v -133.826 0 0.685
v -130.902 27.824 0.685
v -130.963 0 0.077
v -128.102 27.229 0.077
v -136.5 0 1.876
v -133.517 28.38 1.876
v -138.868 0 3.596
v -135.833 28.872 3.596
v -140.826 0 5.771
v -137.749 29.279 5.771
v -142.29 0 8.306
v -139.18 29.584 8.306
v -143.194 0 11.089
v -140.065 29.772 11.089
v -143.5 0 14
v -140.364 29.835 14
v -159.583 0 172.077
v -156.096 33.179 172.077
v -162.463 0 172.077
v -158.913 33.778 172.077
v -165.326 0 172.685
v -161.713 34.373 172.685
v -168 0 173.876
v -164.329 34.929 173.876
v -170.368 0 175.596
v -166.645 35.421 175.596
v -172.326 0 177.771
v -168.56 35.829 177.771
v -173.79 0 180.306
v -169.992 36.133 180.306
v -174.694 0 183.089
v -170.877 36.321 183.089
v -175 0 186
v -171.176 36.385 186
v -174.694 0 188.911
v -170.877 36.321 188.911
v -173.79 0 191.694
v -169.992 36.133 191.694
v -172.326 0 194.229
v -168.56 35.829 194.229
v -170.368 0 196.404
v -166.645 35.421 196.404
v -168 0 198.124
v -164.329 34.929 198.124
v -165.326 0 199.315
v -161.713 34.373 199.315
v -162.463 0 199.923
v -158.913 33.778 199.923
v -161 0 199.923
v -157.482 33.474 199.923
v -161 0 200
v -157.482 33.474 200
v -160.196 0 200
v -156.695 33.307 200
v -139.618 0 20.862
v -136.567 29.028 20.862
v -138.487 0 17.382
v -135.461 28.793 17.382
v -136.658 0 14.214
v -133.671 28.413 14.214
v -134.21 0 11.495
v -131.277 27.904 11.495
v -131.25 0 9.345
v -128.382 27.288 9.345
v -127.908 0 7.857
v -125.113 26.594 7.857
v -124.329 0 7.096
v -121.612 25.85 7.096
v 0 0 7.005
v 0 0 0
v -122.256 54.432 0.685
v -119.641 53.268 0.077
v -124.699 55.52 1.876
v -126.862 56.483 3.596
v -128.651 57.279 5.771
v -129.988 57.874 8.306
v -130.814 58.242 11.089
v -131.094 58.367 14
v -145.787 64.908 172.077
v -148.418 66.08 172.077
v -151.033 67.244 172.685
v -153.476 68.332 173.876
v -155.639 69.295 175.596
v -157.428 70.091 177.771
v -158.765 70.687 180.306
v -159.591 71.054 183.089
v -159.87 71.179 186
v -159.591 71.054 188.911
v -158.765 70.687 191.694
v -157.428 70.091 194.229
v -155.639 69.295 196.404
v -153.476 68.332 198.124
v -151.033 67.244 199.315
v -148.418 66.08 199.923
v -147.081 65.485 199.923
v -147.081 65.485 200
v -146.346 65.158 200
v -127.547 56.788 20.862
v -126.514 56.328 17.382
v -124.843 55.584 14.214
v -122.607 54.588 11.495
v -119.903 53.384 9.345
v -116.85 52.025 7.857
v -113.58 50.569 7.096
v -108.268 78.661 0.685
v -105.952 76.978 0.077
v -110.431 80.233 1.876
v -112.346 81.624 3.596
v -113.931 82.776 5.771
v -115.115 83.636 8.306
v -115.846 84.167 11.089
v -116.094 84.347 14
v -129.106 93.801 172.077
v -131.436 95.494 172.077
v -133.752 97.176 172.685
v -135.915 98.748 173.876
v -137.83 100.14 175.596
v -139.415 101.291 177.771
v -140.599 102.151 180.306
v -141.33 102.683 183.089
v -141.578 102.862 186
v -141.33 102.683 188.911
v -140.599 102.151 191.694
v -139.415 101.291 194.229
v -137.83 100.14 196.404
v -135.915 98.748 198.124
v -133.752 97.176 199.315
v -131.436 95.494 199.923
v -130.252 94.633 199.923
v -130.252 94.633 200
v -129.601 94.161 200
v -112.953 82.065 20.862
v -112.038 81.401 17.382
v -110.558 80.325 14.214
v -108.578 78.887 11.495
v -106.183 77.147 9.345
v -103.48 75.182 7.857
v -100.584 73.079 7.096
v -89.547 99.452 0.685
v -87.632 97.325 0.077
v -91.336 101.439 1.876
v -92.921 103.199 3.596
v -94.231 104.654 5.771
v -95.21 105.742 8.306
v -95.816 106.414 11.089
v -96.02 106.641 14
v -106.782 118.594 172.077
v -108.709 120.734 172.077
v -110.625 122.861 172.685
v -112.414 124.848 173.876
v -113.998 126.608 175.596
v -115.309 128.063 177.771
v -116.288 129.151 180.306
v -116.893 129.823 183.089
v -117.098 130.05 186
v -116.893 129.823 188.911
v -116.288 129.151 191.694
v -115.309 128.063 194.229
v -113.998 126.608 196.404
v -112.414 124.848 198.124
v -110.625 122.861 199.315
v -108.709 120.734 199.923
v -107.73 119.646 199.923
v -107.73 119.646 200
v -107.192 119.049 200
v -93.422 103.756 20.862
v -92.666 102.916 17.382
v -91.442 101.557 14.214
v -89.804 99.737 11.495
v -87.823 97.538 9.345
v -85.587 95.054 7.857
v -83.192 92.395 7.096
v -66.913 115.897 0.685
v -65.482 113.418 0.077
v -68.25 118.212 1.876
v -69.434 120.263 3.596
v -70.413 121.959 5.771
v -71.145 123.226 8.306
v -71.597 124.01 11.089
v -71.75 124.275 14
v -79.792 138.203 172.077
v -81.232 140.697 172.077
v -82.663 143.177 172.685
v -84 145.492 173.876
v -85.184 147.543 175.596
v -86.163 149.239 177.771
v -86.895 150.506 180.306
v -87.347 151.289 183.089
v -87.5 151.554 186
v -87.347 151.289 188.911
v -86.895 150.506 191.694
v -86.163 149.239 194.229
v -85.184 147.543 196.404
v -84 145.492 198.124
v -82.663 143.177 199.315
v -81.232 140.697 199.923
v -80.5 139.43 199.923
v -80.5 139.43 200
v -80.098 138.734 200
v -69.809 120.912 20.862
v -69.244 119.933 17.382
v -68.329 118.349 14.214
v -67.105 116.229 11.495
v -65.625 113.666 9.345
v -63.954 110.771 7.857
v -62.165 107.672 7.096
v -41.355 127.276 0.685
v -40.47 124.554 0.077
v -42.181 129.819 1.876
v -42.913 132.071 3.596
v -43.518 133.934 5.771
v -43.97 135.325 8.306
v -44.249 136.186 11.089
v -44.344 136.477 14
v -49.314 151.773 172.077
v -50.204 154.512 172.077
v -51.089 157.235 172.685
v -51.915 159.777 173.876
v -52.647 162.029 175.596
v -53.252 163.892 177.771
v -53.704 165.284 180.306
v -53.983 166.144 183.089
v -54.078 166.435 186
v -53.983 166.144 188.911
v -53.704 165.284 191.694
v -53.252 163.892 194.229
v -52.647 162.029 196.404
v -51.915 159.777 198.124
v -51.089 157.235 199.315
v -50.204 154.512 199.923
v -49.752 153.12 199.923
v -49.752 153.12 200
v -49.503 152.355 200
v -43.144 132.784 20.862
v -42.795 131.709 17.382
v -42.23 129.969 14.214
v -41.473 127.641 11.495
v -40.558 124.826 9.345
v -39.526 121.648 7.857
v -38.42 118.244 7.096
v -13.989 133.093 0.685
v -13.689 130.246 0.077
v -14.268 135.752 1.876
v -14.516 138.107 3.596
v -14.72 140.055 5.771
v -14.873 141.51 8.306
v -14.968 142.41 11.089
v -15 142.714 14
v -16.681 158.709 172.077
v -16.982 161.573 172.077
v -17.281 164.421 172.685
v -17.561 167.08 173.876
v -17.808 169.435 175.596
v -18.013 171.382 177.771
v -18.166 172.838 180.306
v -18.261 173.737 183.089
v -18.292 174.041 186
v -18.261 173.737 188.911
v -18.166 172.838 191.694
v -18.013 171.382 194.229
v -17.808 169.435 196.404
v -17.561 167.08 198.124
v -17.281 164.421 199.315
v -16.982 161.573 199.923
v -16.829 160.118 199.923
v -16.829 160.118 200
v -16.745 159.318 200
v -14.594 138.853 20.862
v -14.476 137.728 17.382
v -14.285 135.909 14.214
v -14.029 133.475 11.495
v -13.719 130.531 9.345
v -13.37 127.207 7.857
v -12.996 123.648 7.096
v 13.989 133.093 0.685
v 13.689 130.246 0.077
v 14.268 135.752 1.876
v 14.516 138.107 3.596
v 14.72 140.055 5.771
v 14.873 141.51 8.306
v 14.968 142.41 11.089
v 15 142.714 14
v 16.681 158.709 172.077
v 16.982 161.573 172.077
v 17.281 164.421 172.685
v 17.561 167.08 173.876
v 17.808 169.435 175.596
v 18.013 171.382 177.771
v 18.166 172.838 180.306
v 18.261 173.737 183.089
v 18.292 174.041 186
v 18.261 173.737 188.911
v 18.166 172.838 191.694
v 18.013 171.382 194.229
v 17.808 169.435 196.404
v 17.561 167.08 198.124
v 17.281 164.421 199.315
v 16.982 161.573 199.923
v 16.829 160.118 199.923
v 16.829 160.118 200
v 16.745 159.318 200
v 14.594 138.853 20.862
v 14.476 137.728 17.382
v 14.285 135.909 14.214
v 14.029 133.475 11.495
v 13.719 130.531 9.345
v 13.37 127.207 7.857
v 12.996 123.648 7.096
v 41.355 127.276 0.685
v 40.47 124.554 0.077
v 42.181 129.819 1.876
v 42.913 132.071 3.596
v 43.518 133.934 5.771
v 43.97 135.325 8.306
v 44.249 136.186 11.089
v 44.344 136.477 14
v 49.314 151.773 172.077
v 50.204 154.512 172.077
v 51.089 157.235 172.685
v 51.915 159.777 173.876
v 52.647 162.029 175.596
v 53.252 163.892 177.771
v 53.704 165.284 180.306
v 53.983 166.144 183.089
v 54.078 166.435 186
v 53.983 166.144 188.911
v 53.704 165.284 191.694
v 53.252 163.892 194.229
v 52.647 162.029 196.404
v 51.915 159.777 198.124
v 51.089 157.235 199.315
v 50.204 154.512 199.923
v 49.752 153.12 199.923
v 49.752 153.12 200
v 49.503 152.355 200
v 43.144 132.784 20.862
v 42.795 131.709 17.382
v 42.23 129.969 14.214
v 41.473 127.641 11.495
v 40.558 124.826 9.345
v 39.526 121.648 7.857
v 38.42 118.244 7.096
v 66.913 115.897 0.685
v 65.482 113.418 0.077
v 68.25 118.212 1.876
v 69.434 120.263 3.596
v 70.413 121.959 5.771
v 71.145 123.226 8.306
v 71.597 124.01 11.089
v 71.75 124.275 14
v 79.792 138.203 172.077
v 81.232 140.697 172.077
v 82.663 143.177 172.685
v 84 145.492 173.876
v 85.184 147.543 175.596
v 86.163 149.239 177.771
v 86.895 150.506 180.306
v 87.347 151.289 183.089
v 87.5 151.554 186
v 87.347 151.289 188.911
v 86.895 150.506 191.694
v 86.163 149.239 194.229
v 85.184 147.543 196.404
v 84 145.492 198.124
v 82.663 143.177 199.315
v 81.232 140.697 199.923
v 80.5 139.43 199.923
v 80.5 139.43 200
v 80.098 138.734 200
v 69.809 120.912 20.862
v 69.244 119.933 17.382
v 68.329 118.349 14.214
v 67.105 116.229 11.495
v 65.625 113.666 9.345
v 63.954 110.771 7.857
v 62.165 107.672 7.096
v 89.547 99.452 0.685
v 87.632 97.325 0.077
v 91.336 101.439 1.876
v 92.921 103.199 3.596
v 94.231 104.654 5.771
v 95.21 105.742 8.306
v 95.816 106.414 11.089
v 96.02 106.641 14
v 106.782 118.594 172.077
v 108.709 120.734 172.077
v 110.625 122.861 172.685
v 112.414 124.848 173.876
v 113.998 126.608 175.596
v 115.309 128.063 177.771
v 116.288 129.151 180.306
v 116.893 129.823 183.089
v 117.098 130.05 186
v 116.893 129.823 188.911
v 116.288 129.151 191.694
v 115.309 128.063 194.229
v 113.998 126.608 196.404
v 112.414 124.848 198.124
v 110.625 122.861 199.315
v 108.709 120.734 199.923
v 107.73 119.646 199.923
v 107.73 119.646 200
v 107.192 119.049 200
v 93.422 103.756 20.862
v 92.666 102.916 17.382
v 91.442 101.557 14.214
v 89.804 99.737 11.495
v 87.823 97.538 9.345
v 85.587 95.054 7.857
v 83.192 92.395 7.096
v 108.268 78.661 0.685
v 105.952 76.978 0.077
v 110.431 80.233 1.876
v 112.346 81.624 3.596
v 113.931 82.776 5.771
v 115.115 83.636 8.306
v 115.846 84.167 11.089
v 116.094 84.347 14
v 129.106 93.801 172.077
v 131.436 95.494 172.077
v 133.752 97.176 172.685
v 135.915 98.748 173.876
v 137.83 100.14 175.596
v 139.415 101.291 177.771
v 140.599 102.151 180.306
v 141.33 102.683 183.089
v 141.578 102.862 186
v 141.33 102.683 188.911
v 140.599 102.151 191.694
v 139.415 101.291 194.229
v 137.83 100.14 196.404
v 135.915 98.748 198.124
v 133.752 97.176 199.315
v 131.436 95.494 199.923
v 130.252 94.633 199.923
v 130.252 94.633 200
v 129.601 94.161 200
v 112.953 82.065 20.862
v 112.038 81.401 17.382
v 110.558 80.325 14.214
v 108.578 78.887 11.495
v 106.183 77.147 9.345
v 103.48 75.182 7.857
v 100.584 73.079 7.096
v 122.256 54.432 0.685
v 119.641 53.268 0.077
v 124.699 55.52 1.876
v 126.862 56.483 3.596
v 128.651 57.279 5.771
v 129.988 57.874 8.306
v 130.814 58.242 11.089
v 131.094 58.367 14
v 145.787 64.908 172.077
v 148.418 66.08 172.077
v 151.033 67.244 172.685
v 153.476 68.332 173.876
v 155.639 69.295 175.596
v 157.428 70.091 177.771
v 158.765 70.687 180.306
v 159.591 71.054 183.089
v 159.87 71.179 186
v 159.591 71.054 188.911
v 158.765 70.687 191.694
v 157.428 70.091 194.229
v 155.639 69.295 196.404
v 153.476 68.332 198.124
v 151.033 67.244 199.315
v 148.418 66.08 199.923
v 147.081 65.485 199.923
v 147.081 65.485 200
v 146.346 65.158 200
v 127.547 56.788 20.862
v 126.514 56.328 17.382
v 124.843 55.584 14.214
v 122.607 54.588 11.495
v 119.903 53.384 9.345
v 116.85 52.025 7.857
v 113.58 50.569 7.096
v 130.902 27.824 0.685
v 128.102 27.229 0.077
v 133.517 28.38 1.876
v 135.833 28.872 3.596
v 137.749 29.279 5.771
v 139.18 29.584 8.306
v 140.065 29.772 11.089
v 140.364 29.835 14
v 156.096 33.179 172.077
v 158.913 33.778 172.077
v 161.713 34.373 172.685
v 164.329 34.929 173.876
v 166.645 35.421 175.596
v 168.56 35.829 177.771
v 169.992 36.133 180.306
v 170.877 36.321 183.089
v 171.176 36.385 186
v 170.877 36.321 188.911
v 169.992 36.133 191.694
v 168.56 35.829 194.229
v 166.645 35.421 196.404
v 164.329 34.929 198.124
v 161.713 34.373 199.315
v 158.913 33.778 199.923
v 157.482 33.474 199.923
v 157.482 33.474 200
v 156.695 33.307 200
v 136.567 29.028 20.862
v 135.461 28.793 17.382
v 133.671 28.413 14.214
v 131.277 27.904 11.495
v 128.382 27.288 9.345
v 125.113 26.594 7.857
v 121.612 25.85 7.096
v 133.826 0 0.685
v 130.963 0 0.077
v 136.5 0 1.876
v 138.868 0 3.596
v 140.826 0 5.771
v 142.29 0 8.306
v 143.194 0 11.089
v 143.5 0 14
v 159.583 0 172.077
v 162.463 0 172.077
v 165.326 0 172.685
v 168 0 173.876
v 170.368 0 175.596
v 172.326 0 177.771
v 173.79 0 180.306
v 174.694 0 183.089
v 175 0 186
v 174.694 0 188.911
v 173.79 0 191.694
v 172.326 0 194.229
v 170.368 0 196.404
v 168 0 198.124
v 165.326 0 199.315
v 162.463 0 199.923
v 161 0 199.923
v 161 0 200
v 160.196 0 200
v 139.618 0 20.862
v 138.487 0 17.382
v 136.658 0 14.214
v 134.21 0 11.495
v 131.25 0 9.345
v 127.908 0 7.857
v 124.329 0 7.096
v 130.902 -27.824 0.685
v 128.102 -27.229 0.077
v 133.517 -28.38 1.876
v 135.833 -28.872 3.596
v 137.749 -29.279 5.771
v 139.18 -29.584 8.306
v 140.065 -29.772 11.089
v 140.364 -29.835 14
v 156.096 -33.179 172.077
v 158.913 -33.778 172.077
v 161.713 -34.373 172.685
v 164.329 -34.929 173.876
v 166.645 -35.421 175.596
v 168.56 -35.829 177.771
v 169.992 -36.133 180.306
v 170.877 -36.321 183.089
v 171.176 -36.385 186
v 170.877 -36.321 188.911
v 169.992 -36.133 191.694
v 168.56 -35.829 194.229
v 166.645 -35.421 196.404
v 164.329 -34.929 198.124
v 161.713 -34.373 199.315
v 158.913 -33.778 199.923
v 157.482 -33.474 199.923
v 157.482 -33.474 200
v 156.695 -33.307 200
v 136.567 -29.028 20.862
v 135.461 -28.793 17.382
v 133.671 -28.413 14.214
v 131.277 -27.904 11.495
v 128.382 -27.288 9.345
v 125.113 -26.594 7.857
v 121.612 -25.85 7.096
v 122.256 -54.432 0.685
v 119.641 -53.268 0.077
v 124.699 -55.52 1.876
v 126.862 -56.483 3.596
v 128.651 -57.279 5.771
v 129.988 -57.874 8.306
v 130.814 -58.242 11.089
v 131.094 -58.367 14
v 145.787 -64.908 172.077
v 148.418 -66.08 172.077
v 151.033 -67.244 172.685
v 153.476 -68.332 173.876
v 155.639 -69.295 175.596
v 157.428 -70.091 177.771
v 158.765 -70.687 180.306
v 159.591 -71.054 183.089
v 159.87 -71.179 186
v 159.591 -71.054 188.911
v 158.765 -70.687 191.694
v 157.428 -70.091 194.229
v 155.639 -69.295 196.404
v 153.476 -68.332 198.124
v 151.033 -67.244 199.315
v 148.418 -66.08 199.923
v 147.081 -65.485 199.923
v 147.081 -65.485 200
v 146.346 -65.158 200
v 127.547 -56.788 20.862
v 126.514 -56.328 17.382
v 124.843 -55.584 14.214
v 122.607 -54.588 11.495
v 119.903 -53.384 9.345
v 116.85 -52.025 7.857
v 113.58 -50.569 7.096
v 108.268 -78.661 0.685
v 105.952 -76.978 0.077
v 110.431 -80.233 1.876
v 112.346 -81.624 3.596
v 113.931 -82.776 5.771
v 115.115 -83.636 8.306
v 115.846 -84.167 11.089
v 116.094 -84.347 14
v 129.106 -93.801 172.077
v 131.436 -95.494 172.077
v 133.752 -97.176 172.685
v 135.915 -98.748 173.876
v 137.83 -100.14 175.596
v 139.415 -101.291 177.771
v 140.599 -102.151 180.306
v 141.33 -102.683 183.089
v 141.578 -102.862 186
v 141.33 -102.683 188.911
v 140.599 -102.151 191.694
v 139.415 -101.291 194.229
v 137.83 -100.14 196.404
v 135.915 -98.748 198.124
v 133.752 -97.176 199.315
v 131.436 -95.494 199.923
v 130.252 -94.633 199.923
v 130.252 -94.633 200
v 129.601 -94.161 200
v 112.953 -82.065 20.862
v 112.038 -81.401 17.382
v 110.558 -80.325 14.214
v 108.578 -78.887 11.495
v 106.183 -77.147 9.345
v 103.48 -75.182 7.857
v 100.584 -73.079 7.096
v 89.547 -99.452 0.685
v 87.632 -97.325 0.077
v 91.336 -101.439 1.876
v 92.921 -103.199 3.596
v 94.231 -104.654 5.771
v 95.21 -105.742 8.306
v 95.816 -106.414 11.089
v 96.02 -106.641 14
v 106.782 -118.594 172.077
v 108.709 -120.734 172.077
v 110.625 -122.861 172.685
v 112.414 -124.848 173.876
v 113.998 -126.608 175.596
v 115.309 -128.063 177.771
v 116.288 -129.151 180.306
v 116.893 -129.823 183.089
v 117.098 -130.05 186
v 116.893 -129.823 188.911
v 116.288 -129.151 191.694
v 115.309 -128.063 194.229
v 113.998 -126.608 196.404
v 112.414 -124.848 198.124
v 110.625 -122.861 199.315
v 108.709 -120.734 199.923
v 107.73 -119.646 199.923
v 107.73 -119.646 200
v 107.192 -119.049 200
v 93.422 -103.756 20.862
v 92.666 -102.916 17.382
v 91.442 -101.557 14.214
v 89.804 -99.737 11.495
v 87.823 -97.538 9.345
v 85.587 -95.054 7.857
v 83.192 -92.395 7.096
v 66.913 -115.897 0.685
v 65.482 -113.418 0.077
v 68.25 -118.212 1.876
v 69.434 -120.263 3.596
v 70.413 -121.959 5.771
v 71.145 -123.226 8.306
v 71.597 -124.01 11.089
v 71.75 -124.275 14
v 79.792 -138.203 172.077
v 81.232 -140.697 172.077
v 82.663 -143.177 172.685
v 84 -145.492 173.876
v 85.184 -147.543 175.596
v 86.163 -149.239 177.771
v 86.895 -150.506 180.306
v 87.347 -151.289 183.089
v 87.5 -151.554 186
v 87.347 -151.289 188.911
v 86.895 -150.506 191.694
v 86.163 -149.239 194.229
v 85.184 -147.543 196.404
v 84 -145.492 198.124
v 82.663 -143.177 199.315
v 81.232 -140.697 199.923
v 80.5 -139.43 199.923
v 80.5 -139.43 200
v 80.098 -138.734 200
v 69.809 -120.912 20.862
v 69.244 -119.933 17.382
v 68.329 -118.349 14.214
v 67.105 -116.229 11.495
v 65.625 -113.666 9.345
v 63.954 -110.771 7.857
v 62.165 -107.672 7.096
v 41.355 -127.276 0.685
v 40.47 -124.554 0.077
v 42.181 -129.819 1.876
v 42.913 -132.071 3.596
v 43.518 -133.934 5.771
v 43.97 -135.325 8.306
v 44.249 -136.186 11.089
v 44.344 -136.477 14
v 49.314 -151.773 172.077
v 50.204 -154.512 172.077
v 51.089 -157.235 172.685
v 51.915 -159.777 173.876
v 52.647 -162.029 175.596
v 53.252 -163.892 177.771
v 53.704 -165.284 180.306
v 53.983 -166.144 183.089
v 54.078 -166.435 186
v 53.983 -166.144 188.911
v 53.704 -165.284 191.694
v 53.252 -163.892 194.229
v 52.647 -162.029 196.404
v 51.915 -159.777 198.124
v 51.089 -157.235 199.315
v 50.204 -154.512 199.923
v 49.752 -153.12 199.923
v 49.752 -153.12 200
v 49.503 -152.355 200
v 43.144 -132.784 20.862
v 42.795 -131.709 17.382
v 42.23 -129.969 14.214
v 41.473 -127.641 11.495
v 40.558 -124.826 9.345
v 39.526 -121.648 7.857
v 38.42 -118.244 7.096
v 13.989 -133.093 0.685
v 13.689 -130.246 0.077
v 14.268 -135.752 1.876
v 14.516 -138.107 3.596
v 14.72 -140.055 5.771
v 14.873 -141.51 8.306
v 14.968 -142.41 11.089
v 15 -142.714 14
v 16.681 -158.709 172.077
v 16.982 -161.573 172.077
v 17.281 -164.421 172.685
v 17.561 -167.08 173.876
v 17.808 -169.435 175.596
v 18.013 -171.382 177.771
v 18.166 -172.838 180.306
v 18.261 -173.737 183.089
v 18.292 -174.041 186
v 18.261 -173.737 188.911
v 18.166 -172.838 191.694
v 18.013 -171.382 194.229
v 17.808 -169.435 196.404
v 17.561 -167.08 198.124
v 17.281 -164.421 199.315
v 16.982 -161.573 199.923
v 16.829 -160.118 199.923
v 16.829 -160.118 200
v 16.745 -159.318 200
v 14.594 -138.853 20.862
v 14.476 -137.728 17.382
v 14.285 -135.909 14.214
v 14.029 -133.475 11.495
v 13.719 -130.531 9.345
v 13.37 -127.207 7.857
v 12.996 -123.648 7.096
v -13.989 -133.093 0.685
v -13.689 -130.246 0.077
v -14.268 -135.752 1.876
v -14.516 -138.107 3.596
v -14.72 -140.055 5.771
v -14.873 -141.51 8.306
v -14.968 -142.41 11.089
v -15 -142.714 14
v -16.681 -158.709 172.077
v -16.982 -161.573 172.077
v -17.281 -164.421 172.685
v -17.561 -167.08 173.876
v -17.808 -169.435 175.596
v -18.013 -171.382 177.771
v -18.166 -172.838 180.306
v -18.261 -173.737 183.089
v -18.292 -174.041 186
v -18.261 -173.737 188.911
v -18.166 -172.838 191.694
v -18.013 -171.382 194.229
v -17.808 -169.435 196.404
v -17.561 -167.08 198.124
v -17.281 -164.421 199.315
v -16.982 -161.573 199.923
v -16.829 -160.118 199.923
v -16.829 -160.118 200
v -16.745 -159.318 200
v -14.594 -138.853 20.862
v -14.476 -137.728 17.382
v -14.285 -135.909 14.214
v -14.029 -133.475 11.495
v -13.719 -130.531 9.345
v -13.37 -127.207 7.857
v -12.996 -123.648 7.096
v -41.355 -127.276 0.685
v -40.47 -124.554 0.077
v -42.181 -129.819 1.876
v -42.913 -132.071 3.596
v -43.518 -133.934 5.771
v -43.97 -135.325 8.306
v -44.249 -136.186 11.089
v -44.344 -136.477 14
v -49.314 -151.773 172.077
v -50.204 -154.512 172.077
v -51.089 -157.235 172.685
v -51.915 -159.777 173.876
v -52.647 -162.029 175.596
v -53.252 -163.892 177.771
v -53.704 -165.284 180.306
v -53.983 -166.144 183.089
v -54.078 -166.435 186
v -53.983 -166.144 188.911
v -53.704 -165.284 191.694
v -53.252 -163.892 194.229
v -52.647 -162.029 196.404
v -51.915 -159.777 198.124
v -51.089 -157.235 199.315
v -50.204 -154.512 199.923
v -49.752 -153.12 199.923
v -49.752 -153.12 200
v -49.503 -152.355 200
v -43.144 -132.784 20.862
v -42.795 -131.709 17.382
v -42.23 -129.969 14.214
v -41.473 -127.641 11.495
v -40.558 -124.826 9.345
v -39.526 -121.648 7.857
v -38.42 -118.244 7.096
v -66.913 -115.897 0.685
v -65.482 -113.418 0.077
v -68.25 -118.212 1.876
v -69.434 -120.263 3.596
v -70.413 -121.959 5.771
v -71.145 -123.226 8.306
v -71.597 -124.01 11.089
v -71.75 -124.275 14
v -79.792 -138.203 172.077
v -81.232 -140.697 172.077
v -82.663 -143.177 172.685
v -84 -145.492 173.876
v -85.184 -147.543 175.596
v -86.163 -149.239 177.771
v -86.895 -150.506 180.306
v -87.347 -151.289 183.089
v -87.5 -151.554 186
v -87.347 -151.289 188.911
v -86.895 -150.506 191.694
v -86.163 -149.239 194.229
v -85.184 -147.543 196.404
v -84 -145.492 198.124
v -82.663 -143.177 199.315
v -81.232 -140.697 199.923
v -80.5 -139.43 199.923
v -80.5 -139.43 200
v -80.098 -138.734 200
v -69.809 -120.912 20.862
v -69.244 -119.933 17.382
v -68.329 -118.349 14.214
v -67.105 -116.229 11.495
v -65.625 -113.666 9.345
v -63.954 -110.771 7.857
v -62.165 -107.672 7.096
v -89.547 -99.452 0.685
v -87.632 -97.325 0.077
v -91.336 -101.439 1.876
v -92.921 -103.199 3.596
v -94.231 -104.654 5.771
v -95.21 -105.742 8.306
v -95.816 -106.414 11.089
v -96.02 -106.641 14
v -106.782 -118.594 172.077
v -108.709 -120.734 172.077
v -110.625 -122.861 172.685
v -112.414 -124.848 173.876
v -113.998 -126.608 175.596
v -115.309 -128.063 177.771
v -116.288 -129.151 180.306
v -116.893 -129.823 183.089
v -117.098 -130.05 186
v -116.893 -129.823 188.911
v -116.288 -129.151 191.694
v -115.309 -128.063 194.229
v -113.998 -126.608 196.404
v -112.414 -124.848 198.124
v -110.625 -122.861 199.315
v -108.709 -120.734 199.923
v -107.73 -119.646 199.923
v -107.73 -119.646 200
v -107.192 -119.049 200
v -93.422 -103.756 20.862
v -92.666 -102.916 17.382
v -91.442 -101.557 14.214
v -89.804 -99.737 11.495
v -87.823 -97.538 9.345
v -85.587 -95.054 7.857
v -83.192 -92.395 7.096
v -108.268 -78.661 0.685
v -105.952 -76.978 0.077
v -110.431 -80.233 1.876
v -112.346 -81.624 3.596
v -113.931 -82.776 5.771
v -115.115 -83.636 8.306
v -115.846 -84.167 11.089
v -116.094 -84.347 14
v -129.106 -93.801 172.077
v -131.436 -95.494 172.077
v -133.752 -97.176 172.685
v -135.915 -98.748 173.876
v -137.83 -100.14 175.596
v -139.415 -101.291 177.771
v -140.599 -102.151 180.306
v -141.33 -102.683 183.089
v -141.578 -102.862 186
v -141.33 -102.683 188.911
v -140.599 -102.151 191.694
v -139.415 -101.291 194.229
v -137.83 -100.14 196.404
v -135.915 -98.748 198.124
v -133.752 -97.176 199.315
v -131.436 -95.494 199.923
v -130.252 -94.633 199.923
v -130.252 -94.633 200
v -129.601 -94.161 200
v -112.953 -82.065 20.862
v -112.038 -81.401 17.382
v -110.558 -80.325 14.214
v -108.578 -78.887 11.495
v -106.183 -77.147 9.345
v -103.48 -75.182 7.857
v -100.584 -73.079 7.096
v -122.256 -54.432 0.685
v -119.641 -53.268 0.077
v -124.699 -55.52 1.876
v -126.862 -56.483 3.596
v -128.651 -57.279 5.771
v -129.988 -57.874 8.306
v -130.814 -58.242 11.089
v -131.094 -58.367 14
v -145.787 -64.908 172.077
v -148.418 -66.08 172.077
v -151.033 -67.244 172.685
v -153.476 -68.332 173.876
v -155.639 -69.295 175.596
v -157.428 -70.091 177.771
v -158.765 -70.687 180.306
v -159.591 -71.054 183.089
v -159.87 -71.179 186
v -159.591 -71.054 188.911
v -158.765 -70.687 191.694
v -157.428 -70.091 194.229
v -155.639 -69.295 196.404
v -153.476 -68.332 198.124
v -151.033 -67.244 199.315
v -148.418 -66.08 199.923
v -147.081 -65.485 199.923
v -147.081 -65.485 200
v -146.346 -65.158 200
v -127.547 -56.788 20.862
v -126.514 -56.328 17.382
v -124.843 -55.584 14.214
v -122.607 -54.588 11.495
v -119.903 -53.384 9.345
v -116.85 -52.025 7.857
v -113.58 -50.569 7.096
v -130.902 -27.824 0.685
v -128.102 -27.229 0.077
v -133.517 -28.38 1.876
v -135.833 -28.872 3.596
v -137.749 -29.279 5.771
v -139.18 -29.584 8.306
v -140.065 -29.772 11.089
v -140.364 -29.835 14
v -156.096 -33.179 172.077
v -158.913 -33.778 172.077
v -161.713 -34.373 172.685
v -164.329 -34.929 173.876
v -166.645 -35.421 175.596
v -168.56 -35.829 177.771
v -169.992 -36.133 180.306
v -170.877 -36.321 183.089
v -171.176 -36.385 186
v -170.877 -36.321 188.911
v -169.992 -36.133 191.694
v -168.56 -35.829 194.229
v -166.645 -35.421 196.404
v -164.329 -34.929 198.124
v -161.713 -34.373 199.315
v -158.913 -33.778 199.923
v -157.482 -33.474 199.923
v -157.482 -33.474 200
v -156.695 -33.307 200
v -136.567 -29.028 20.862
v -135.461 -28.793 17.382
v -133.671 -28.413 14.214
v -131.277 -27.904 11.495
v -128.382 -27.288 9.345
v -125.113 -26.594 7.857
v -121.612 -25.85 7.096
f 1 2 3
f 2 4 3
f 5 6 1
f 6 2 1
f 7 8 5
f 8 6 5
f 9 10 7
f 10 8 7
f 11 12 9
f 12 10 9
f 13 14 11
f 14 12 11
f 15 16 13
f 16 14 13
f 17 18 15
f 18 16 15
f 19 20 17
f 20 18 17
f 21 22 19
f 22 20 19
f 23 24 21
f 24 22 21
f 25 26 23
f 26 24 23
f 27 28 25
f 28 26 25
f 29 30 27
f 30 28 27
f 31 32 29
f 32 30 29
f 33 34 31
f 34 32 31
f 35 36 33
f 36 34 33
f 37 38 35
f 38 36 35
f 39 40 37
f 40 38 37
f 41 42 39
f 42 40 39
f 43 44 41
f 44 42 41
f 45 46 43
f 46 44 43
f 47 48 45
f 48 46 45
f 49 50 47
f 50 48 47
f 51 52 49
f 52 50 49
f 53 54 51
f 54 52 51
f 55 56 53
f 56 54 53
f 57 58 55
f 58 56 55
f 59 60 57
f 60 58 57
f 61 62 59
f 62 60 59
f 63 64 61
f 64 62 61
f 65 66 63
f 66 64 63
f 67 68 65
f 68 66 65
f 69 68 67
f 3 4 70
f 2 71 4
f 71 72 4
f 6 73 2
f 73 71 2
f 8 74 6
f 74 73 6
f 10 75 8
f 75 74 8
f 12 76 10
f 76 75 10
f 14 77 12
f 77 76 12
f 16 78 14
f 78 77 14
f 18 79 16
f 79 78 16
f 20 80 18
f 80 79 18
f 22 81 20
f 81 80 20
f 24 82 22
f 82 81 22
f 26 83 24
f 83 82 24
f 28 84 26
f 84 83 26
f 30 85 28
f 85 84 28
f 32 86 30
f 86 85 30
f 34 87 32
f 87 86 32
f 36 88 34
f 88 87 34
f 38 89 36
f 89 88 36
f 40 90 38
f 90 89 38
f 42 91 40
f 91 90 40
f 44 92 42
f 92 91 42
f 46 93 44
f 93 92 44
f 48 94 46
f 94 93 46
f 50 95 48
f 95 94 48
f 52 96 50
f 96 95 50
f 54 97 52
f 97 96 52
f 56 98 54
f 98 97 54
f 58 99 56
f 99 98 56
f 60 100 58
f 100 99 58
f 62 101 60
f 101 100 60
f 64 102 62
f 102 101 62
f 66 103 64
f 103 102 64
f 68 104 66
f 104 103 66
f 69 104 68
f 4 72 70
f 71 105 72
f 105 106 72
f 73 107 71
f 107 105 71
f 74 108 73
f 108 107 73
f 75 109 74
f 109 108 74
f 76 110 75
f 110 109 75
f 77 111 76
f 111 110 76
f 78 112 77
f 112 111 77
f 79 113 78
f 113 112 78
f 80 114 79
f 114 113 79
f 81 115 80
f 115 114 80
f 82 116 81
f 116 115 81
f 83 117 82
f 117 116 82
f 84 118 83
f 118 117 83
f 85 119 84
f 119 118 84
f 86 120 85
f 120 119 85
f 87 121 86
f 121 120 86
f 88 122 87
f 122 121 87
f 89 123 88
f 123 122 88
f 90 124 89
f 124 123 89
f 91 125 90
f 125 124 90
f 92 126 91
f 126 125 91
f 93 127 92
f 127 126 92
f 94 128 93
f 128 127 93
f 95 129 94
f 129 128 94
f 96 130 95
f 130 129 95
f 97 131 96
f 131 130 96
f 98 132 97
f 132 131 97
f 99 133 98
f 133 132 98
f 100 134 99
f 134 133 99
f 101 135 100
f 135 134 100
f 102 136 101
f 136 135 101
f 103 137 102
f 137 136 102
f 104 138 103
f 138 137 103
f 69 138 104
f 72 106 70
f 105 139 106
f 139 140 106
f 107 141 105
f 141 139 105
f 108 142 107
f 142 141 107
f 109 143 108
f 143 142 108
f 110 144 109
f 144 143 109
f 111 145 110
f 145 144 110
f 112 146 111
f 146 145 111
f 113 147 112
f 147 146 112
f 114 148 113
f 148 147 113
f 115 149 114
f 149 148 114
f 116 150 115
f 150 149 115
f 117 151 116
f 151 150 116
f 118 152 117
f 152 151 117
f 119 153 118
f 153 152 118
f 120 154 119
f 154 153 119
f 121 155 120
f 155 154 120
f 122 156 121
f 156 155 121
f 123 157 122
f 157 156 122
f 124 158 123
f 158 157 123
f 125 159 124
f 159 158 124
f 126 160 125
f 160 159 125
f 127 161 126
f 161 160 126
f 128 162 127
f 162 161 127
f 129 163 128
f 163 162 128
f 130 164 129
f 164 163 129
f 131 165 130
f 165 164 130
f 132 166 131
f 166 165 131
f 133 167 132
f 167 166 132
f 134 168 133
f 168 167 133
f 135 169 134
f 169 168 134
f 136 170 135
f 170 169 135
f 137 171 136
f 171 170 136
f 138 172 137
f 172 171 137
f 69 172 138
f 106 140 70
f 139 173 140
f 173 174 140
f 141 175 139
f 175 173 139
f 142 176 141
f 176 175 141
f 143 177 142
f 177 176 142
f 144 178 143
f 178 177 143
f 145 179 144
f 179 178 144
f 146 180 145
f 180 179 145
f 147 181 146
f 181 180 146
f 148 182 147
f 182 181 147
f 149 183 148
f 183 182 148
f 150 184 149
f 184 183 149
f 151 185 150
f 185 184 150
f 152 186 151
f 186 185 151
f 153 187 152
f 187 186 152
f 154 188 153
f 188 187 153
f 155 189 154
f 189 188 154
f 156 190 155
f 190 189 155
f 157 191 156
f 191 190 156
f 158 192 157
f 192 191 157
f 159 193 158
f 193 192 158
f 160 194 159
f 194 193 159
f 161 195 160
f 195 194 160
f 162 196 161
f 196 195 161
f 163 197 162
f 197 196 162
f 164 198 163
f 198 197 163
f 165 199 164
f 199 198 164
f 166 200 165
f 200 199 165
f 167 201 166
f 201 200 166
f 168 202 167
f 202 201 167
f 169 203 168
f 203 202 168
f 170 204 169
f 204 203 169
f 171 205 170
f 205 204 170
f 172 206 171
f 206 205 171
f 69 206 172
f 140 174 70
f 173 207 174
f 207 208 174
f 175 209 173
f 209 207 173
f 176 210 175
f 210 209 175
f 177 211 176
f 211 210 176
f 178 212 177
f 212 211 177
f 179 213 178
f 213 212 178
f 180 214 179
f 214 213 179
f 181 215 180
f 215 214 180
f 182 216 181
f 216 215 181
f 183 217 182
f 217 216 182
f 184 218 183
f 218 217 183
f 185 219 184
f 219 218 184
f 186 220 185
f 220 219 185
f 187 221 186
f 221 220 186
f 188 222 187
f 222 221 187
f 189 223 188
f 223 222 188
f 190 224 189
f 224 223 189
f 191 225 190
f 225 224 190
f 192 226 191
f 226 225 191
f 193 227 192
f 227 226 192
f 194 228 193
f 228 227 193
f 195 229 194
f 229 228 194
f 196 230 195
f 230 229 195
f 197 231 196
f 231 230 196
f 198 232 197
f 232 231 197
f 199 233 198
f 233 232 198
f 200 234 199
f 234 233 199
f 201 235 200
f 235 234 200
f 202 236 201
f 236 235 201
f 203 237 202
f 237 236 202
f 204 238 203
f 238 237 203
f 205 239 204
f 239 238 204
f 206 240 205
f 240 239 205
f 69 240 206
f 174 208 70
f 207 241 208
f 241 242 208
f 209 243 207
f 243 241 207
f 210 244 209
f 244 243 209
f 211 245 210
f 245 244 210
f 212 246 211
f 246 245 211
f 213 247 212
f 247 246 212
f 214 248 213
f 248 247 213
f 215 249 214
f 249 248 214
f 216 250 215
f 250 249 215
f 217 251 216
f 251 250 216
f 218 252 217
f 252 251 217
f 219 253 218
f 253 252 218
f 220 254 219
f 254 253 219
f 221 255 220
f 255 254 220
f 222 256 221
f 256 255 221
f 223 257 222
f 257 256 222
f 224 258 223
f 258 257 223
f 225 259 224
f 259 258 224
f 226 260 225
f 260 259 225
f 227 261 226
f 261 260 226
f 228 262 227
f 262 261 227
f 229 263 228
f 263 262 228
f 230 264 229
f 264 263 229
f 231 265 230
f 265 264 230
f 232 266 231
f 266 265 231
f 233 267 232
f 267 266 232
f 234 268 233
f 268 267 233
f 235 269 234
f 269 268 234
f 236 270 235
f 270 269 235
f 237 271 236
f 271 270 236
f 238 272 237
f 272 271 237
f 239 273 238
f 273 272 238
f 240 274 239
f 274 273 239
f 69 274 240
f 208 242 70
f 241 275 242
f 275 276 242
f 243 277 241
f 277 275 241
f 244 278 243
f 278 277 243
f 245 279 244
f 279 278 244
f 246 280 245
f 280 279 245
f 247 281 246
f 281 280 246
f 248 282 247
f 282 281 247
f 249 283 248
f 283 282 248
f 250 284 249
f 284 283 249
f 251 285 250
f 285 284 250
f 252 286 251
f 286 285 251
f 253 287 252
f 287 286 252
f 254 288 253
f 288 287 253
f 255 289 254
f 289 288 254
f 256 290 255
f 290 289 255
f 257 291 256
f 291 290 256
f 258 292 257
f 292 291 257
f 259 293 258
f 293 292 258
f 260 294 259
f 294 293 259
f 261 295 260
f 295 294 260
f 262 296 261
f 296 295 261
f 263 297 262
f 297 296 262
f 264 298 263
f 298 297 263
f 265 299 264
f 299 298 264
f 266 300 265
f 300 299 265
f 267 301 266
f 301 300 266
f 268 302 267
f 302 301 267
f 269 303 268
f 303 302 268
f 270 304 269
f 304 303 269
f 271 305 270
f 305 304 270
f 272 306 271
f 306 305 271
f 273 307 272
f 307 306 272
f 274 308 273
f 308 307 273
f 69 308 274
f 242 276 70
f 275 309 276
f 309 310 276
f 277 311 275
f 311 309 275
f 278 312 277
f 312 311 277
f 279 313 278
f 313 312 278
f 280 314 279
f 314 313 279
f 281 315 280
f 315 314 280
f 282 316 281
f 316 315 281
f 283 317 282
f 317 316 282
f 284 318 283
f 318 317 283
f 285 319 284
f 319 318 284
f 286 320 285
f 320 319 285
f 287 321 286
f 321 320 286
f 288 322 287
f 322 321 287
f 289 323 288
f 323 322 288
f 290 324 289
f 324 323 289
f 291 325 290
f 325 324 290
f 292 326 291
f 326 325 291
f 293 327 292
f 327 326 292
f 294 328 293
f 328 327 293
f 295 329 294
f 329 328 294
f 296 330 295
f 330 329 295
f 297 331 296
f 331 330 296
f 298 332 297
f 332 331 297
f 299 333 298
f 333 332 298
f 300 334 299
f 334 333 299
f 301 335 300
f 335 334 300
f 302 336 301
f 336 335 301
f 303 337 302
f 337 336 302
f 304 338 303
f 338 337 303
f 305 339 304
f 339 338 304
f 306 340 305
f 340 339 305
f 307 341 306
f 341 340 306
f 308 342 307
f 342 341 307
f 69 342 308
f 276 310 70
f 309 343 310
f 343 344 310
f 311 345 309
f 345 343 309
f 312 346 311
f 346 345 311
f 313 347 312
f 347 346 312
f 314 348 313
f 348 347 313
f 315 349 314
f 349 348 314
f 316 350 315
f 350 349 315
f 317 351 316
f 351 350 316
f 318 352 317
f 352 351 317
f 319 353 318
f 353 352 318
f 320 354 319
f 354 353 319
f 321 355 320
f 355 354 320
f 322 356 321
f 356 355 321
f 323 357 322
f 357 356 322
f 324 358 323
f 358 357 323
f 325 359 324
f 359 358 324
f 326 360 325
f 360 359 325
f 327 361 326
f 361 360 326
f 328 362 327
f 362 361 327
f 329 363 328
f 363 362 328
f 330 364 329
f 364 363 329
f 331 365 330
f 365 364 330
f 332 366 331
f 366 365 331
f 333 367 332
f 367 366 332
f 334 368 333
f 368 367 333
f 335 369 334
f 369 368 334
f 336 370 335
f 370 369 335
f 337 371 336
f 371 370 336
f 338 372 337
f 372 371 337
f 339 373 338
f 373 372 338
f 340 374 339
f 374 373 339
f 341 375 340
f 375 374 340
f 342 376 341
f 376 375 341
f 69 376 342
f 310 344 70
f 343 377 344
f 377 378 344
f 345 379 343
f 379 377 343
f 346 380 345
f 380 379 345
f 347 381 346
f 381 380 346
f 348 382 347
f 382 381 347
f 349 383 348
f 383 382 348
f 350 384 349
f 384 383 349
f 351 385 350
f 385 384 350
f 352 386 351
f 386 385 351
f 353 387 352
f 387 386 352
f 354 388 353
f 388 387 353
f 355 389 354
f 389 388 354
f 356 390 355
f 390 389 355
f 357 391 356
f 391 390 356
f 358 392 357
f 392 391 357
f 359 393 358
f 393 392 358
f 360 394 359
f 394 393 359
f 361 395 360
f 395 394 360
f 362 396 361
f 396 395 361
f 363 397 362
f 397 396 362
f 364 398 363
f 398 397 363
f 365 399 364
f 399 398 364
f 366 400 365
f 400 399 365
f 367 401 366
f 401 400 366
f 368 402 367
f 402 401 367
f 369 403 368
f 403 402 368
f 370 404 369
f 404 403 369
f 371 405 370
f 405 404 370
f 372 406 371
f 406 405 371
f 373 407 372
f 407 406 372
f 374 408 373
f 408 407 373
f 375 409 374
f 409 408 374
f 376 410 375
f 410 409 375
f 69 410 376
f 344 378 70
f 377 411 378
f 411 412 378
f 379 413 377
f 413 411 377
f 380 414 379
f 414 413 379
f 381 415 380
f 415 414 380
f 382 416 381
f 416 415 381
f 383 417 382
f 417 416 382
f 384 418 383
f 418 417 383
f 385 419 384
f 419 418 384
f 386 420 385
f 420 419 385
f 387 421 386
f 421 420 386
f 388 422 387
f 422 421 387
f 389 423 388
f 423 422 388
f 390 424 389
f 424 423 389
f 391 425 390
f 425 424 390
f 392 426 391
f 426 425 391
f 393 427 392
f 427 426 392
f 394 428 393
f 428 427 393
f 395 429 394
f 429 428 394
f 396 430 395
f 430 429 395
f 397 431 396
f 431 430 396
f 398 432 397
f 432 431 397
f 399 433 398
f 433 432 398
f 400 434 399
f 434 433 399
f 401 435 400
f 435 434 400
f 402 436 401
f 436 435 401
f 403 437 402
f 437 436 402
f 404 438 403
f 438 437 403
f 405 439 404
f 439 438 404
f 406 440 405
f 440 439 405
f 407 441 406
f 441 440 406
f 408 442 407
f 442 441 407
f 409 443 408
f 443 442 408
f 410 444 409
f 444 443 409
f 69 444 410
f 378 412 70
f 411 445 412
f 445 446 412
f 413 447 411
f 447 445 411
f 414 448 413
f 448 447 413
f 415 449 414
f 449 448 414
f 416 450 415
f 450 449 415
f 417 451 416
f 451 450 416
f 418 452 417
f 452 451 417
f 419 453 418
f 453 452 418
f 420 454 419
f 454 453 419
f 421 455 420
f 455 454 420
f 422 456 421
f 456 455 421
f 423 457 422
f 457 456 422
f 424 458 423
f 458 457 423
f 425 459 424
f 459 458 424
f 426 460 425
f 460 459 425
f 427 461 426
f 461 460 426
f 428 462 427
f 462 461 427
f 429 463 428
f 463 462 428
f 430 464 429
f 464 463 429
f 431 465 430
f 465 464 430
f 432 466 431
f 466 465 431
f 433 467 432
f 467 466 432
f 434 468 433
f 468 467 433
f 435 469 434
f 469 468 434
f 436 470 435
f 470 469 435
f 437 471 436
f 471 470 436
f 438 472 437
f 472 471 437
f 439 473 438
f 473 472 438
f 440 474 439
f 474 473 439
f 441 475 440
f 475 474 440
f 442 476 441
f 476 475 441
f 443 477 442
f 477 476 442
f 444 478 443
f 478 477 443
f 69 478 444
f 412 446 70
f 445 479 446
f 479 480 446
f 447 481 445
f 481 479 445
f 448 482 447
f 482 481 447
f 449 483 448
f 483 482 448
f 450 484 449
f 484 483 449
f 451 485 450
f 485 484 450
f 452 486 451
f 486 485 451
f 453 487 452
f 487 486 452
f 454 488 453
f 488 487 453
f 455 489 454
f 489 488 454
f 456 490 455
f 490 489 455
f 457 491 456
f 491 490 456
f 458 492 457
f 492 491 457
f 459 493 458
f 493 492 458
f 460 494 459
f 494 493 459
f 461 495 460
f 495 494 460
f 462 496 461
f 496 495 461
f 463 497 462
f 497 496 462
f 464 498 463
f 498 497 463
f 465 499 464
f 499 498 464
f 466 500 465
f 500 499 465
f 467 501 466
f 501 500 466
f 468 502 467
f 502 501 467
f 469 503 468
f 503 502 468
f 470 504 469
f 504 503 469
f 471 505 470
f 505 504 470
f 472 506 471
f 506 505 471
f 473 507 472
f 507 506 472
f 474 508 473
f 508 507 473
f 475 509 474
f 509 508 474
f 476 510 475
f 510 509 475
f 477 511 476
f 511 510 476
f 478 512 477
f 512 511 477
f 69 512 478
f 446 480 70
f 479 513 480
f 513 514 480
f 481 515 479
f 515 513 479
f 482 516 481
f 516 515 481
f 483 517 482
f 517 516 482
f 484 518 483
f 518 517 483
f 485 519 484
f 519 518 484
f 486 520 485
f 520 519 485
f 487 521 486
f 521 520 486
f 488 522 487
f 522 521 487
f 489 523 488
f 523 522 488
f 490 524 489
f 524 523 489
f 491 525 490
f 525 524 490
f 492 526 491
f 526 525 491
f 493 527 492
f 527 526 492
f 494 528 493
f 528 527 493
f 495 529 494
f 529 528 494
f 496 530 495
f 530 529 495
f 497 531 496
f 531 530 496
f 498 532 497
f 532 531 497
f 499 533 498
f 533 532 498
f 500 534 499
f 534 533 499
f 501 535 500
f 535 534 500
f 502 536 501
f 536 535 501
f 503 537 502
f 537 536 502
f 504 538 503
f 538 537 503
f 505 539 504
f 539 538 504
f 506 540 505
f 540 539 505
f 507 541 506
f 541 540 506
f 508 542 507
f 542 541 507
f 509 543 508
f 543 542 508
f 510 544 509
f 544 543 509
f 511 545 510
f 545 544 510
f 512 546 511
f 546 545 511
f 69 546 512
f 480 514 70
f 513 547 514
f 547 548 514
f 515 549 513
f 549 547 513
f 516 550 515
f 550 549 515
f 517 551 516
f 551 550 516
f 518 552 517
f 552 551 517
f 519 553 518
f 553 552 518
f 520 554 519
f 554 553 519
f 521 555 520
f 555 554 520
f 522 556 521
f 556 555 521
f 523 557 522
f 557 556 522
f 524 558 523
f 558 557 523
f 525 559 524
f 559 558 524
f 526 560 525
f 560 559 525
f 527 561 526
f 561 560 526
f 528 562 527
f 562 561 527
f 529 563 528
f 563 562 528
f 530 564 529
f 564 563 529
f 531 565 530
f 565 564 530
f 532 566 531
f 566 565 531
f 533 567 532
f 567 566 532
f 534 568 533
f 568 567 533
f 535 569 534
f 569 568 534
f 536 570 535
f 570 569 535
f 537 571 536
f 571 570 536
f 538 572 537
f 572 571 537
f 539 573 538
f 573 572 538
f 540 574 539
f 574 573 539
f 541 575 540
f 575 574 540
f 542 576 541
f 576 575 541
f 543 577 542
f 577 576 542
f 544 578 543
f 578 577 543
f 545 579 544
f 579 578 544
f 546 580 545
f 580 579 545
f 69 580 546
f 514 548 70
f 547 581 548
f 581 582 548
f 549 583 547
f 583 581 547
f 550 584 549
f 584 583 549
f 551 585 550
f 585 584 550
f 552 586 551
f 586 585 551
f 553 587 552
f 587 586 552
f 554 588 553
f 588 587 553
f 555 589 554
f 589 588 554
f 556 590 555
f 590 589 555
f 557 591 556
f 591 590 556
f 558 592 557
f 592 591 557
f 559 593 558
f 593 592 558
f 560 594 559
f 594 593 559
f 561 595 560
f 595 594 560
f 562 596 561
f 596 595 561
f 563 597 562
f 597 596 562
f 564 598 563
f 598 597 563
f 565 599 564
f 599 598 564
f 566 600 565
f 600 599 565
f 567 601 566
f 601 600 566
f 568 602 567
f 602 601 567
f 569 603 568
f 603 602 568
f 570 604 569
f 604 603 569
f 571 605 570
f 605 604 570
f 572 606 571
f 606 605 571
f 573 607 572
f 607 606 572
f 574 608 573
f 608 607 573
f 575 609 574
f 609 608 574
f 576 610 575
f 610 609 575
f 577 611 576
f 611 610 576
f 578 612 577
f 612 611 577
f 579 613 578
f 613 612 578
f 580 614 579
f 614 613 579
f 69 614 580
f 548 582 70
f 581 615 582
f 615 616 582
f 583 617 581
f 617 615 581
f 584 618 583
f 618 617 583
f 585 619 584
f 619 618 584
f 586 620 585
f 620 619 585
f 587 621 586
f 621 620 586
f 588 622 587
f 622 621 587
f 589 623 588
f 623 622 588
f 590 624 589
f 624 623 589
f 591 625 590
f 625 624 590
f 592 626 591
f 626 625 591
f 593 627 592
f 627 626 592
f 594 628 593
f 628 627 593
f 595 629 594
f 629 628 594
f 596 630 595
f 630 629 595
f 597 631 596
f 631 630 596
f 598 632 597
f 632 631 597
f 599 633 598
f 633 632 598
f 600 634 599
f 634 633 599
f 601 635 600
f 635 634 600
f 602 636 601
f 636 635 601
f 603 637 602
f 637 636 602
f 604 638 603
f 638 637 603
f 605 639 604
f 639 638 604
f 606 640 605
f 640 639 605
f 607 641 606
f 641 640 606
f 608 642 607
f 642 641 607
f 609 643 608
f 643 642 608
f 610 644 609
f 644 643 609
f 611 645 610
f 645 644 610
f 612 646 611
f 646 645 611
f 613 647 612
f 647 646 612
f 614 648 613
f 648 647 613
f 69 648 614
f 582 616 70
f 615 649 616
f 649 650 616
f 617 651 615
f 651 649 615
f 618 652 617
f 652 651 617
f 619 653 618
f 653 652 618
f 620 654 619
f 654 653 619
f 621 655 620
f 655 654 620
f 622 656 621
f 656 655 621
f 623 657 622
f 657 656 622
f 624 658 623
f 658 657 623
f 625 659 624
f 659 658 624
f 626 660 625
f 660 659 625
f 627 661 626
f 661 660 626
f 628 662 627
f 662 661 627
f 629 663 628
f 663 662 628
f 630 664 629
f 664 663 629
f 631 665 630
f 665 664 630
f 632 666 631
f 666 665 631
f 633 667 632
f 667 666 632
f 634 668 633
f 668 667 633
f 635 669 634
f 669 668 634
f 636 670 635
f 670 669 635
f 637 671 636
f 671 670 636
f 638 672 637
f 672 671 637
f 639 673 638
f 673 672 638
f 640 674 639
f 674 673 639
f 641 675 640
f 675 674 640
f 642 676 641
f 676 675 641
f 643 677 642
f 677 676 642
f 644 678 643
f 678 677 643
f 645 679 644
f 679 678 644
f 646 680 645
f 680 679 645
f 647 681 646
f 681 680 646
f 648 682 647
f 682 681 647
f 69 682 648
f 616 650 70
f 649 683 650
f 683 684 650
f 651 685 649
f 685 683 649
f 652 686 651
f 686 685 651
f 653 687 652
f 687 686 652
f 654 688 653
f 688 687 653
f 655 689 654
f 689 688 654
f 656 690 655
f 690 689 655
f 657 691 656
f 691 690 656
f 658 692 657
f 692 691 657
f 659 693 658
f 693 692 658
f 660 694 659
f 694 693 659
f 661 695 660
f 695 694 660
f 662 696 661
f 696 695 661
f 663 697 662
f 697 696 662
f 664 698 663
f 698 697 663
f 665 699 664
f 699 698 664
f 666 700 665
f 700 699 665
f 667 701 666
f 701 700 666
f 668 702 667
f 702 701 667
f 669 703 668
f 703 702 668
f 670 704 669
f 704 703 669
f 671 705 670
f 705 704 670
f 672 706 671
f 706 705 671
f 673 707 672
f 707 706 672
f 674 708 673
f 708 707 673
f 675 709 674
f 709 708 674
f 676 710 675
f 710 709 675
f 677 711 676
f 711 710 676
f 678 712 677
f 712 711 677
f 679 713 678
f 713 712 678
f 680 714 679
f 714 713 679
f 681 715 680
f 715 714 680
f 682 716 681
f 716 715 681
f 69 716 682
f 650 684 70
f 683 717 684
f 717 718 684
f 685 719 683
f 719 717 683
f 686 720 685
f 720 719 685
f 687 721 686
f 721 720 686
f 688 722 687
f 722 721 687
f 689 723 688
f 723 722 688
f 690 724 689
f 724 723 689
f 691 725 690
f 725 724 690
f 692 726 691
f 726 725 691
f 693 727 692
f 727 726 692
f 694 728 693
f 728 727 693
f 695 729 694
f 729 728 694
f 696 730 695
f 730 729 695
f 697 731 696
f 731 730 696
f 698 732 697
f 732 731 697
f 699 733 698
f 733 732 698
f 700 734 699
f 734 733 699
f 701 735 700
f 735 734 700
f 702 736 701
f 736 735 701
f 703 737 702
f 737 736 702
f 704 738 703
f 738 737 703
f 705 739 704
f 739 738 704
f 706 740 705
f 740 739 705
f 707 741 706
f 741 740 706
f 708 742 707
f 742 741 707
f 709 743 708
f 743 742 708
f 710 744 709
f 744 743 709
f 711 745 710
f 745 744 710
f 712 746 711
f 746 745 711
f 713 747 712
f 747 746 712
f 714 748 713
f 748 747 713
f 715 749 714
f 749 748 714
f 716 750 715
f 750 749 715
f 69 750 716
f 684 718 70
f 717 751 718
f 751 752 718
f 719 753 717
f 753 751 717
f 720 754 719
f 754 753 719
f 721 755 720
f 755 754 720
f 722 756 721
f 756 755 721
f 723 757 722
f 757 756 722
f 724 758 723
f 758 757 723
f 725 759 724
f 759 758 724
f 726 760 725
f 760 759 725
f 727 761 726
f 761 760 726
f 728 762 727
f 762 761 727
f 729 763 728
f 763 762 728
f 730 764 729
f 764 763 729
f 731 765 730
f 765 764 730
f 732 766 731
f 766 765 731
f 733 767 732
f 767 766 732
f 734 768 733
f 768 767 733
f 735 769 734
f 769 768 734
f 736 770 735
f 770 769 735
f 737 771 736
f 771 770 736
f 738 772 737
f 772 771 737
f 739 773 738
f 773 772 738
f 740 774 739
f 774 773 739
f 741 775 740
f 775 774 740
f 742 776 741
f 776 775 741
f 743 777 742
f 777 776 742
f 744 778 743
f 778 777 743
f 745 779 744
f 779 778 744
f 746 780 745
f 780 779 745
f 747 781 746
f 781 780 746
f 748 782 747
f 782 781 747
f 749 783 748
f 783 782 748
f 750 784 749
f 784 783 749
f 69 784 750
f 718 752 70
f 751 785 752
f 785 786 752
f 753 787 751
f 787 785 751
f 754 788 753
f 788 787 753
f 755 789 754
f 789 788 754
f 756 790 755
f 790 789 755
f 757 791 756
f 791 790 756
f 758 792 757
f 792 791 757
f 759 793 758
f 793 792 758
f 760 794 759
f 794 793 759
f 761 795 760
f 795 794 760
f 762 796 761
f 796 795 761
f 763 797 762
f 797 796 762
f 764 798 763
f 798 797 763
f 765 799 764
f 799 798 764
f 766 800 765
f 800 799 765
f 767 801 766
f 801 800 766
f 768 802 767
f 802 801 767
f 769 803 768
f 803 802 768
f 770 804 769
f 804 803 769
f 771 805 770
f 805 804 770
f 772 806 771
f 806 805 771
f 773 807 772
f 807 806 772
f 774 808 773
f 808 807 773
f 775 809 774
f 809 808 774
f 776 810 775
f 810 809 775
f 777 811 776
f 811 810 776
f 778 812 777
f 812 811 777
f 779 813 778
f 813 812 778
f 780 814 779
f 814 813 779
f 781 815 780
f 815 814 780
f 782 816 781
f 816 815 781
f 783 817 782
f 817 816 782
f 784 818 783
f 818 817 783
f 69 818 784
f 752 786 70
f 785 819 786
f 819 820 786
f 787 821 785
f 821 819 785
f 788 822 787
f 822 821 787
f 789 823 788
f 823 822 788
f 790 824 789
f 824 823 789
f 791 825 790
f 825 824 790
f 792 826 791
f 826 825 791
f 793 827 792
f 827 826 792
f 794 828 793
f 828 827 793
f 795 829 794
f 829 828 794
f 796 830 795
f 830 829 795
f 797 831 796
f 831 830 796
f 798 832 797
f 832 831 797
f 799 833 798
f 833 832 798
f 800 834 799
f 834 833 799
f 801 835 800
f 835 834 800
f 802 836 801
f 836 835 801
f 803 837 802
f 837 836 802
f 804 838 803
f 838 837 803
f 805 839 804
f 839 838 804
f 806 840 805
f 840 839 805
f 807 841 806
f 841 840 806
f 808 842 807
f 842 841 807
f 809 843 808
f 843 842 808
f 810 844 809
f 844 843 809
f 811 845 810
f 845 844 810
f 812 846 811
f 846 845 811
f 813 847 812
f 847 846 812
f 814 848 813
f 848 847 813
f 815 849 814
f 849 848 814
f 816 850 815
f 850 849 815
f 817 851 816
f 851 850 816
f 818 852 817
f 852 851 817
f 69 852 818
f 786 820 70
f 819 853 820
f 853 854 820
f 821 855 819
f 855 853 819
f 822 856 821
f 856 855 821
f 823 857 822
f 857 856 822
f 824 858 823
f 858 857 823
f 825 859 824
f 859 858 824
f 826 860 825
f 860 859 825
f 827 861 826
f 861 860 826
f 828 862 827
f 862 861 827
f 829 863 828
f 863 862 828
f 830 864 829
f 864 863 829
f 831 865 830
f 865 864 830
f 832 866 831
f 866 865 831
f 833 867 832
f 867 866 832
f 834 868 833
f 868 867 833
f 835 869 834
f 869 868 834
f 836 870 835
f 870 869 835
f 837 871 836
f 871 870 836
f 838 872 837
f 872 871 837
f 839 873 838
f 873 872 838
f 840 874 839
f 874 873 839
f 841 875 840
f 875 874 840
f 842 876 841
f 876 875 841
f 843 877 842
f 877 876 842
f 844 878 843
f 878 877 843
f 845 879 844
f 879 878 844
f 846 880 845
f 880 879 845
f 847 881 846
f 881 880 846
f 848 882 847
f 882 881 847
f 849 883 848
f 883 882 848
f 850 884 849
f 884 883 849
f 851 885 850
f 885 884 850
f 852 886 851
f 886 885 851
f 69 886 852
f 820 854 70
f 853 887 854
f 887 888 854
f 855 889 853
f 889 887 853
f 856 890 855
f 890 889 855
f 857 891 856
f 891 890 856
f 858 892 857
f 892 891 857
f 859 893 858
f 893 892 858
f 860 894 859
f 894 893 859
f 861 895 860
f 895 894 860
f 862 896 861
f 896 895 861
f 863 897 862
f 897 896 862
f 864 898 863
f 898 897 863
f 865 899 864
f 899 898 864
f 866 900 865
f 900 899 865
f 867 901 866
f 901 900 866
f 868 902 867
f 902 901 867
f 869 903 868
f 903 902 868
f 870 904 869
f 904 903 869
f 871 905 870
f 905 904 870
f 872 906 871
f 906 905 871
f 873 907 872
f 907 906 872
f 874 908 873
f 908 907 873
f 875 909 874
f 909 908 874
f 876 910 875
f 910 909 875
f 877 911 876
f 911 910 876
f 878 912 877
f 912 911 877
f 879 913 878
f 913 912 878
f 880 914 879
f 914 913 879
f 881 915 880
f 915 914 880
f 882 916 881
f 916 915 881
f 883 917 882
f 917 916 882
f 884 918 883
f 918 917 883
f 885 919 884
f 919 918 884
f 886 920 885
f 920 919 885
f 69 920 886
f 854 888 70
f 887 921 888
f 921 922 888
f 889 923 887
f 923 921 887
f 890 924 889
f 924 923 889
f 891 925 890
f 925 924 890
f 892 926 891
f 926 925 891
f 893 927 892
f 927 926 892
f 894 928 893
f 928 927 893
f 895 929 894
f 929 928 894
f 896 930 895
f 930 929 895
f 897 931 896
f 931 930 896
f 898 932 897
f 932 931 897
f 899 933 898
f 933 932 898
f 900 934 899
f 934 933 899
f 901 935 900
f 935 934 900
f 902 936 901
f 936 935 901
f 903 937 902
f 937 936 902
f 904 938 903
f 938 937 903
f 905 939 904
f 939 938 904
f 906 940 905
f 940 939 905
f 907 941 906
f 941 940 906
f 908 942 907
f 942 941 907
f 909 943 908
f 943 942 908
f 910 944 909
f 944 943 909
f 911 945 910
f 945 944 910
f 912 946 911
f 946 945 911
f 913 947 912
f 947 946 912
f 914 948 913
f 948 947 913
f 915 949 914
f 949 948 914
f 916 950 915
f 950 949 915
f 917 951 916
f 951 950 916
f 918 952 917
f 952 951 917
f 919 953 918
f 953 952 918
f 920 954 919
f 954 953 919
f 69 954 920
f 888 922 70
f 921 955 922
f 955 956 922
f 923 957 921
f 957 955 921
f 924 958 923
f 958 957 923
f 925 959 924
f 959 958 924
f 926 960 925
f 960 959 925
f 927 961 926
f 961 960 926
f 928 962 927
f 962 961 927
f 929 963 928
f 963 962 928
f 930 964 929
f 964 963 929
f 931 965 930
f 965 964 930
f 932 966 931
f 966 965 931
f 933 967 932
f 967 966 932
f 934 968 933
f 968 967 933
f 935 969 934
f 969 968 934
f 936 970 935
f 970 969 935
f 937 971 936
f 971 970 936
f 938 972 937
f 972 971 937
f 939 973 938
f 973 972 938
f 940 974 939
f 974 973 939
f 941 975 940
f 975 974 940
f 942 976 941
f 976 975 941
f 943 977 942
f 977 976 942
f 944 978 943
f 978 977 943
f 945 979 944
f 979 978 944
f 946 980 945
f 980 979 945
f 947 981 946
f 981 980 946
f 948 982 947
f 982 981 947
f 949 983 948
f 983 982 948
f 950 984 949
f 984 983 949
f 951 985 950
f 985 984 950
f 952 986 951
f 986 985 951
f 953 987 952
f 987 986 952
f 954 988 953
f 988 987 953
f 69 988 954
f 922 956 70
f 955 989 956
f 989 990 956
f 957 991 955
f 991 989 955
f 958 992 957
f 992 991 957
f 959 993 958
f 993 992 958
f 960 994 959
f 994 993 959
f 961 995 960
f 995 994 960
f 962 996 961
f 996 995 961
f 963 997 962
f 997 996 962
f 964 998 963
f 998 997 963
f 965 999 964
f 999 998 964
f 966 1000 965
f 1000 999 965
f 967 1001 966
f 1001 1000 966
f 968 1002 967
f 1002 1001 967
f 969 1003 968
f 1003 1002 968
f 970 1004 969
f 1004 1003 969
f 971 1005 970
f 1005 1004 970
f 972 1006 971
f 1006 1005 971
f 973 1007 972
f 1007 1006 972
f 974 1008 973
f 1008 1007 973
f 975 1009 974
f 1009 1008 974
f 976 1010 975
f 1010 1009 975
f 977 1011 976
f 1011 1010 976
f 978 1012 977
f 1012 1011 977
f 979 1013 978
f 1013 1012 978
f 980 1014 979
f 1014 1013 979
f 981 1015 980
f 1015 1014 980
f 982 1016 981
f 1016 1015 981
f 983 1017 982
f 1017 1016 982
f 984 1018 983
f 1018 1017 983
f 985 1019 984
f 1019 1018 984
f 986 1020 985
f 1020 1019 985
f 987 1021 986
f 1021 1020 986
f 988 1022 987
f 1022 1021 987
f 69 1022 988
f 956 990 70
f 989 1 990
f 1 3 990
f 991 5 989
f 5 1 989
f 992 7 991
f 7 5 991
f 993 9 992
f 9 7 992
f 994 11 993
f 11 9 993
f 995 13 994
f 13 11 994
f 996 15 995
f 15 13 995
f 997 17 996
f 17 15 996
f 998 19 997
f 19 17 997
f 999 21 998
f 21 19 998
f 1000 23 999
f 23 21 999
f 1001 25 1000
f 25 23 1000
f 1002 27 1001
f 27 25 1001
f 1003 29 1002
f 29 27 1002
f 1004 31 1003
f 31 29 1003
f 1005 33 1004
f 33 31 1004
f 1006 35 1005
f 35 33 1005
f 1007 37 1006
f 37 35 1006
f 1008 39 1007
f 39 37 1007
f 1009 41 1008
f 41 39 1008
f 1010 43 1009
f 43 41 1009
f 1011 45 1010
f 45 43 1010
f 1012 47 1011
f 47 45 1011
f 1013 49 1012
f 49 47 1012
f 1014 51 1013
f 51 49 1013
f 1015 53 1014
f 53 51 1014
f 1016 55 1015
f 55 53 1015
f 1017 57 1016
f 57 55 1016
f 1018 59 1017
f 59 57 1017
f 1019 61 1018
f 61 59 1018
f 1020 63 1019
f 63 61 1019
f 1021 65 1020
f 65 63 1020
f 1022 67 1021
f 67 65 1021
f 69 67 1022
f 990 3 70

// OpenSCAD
// file: modules/pipe.scad
length=800;
diameter=200;

module pipe(l=length,d=diameter) {
 //diameter
    r=d/2;
    wt=1;
    linear_extrude(l)
    difference() {
        circle(r);
        circle(r-wt/2);
    }
}

pipe();
// file: ../shared/bucket.scad
height=200;
diameter=350;

module bucket(d=diameter,h=height) {
    re=d/25; // radius edge
    wt=d/50; // wall thickness
   
    rotate_extrude(convexity=10)


    difference() {


    union()
    {
        translate([d/2-re,h-re]) circle(re);
        hull() {
        translate([0.37*d,re, 0]) circle(re);
        polygon([[0,0],[d/2-re,h-re],[0,h-re]]);
        translate([0,h-re]) square([d/2-re,re]);
    
        }
    }  
     translate([-wt,wt]) 
       hull() {
    translate([0.37*d,d/20, 0]) circle(d/20);
    polygon([[0,0],[(d-re)/2,h],[0,h]]);
    }
  

    }
    
    
}

bucket();
// main file
use <../shared/bucket.scad>
use <modules/pipe.scad>

pipe_length=800;

module unit(l=pipe_length) {
    
    



    
    //pipe(l);
    bucket();
}

unit();
